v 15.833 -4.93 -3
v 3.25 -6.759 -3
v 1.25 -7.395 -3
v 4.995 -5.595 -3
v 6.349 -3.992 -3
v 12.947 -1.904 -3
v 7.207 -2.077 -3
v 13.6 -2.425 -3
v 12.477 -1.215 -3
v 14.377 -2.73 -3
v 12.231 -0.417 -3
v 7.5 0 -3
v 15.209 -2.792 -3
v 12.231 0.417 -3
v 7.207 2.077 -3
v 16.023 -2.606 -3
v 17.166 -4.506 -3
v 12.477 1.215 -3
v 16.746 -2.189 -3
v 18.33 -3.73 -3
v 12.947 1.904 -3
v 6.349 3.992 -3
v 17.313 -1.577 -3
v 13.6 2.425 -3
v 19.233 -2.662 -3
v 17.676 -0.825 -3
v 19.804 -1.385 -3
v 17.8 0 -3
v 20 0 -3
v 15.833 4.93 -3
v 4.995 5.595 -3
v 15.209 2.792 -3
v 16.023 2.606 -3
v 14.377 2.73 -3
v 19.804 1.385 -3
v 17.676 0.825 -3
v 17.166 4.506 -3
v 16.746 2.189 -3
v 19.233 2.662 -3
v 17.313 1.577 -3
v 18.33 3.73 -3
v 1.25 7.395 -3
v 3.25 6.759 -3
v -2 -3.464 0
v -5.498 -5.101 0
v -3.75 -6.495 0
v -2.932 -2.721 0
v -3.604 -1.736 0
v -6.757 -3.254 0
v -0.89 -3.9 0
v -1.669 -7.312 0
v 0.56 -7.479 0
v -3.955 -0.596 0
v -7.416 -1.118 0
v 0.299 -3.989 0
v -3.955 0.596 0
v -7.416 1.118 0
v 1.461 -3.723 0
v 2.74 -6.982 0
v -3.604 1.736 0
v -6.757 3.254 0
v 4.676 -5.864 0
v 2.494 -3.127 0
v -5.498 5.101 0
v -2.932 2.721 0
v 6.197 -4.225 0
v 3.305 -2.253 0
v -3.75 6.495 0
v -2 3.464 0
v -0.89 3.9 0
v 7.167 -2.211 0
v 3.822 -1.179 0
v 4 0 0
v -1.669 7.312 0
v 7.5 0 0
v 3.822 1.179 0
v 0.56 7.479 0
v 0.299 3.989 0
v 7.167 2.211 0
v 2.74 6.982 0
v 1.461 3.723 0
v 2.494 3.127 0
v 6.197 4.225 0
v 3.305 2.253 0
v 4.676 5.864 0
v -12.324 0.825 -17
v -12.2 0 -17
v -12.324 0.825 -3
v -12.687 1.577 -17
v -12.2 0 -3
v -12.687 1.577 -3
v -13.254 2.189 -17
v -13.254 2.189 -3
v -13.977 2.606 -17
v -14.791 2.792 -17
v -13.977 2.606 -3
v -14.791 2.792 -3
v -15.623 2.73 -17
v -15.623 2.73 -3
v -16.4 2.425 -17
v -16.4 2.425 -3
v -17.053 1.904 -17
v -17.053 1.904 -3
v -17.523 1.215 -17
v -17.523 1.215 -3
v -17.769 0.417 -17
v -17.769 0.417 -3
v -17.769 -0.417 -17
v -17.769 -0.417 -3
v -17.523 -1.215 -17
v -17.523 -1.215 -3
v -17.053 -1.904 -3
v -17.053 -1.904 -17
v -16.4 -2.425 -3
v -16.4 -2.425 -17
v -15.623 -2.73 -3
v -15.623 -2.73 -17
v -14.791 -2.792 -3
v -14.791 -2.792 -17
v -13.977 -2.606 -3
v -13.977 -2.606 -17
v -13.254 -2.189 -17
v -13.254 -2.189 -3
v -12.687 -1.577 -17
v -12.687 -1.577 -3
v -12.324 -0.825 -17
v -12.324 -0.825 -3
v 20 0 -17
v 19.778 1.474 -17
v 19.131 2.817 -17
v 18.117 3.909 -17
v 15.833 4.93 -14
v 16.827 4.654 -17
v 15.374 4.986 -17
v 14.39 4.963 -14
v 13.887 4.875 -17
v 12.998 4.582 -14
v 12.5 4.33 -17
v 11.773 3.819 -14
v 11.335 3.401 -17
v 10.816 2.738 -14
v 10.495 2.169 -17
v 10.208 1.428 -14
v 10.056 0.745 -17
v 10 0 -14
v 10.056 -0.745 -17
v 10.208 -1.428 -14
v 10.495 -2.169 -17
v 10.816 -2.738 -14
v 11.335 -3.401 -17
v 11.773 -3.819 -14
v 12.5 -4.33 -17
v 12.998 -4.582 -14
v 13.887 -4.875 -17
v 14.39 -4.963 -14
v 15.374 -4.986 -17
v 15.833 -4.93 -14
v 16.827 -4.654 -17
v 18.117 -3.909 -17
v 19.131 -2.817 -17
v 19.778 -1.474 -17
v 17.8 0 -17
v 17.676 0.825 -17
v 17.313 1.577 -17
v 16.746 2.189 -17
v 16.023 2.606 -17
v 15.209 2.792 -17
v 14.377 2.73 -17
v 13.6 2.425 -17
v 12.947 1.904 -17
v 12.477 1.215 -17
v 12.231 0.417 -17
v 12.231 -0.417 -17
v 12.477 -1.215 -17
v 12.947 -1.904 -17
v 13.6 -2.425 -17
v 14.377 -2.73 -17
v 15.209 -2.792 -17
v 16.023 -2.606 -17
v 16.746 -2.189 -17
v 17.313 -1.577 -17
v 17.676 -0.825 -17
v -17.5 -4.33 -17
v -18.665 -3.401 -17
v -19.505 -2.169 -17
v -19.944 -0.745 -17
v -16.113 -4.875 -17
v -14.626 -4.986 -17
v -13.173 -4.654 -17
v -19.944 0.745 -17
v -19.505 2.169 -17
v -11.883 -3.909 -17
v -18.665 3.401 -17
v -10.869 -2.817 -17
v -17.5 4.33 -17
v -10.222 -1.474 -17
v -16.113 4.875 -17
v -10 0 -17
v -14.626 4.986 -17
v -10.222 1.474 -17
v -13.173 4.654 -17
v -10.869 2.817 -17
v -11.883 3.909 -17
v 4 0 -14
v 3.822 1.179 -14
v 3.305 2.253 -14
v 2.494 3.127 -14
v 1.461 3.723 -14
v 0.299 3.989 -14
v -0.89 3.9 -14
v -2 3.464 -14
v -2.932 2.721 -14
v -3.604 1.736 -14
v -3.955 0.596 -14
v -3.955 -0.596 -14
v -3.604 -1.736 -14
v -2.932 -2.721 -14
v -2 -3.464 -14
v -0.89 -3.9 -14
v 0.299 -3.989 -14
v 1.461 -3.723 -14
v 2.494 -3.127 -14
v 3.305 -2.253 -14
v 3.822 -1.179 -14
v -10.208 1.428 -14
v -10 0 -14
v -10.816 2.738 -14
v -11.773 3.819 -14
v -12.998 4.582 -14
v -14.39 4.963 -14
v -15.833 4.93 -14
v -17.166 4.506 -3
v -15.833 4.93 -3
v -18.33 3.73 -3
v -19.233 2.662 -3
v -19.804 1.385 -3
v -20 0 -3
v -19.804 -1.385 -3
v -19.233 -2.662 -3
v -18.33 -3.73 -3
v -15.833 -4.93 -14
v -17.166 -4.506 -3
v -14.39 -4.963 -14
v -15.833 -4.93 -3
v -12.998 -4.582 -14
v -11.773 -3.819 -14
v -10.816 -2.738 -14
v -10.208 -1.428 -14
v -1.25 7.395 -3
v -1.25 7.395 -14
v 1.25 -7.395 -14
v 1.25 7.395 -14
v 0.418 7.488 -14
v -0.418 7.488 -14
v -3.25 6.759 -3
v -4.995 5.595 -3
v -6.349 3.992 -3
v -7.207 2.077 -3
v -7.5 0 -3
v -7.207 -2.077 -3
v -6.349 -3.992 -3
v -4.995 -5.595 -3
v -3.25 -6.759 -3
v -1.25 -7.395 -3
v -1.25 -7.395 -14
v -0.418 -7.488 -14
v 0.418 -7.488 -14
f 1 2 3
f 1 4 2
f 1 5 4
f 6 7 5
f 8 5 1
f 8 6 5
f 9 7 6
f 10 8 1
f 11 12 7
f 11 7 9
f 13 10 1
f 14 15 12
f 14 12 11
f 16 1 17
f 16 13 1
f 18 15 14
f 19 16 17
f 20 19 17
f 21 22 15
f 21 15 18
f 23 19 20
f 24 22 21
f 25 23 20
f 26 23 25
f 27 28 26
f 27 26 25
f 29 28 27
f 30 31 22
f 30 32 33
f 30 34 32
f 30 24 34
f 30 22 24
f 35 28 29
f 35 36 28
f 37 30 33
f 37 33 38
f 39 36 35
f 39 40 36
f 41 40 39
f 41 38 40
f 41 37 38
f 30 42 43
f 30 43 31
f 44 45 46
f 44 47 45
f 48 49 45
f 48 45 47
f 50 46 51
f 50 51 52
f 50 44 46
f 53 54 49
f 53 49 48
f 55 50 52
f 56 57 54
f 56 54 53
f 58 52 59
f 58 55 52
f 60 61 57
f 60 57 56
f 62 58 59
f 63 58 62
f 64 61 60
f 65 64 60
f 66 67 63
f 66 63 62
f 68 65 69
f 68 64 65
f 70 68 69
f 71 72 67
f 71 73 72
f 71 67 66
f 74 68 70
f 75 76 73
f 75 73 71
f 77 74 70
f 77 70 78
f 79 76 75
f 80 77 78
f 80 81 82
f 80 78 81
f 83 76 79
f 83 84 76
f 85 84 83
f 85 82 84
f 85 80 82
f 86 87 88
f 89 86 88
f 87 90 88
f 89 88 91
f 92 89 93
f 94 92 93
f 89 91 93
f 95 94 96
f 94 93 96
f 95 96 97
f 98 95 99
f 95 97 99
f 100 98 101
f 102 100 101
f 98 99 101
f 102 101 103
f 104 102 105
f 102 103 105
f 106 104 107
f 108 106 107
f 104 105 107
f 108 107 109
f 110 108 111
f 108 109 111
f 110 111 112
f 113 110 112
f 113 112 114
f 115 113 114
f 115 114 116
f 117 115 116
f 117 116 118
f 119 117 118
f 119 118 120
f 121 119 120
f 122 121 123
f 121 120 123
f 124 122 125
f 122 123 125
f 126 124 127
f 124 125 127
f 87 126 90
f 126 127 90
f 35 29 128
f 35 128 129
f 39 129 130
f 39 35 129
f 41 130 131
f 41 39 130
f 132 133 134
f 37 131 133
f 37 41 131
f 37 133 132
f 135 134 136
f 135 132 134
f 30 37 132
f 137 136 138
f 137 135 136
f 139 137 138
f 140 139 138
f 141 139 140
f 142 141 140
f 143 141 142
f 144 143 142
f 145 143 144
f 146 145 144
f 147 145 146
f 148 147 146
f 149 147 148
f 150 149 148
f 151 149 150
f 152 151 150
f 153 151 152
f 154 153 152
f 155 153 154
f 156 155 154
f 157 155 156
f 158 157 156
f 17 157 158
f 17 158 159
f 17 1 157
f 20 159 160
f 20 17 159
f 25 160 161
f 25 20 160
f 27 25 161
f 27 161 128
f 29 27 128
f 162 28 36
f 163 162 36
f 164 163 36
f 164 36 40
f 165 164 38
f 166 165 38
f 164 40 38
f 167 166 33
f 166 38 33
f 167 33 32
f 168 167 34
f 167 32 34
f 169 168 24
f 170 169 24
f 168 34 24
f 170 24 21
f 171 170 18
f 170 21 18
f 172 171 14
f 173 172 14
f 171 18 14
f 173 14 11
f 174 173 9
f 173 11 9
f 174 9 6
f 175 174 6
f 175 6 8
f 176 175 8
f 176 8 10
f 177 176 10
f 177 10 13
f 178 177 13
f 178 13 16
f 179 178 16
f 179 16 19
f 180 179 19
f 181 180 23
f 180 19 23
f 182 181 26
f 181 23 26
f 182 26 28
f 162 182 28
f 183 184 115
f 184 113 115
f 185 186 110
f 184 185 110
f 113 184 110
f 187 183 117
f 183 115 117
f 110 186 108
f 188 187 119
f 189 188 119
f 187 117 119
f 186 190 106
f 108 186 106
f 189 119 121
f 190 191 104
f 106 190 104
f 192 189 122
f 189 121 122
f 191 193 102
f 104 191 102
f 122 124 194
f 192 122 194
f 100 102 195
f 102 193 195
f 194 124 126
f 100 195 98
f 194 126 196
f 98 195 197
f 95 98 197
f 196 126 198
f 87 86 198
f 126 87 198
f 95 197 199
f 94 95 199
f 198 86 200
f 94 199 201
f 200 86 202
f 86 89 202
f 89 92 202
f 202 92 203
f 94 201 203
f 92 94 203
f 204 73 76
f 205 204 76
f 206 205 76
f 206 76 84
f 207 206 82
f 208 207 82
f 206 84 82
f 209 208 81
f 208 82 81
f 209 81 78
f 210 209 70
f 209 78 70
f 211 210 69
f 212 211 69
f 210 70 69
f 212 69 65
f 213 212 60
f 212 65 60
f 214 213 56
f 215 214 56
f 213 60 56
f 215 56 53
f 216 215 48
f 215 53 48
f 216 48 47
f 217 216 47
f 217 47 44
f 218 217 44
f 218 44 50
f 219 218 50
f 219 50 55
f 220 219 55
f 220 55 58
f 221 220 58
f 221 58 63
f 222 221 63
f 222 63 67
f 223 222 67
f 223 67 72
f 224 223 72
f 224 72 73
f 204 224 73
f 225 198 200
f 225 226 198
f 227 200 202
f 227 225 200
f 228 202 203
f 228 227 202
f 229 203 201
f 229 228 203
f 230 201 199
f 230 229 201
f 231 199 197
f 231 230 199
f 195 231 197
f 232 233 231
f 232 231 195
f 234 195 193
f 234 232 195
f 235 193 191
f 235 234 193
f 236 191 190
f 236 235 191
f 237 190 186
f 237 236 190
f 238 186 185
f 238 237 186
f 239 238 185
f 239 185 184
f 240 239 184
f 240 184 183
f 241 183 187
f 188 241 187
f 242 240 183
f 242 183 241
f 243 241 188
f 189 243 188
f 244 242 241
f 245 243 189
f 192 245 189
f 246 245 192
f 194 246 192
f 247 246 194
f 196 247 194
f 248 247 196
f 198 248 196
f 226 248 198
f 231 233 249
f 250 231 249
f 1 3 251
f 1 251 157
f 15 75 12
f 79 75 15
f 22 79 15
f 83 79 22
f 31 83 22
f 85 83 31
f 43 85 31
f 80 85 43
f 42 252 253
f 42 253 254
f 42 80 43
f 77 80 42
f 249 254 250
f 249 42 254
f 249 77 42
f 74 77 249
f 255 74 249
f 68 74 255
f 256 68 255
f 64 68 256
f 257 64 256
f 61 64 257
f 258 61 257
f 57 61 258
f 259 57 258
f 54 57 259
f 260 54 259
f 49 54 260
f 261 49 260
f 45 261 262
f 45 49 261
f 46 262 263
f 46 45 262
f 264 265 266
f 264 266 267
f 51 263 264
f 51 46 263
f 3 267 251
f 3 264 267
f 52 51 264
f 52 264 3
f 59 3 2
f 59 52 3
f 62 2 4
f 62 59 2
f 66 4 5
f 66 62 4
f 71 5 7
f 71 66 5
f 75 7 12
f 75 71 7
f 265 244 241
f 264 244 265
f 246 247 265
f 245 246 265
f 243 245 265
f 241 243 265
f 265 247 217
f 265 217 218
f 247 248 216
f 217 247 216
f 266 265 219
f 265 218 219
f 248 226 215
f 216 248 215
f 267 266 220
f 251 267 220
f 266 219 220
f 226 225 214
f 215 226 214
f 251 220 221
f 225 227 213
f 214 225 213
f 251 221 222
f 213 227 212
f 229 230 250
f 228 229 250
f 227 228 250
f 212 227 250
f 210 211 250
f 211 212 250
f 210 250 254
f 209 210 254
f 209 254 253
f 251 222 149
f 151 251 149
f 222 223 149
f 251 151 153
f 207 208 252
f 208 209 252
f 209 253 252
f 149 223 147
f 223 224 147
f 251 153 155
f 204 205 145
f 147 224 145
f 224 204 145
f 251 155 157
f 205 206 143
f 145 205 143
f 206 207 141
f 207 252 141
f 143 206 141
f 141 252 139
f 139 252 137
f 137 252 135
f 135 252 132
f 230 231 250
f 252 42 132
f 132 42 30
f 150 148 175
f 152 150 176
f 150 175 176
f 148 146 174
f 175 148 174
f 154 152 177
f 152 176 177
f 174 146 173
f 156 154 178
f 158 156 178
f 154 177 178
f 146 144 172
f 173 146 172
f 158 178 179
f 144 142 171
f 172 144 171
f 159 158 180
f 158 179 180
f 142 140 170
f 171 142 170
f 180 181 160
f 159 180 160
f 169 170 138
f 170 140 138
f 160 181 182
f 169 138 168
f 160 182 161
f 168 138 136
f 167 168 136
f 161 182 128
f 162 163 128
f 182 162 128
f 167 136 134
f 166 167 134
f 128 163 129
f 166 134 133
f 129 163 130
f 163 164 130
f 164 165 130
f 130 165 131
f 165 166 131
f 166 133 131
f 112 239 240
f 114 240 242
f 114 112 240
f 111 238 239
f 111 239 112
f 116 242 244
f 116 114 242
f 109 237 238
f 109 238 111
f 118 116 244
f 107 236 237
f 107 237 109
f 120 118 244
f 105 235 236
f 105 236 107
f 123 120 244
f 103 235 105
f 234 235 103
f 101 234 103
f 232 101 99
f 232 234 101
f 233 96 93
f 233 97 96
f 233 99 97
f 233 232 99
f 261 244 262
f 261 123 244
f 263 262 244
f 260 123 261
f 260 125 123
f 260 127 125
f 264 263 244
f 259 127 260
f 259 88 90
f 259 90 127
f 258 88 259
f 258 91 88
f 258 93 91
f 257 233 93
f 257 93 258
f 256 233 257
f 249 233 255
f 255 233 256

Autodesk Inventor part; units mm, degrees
ref_plane "YZ Plane" through (0, 0, 0) normal (1, 0, 0) x (0, 1, 0)
ref_plane "XZ Plane" through (0, 0, 0) normal (0, 1, 0) x (-1, 0, 0)
sketch "Skizze1" plane through (0, 0, 0) normal (0, 0, 1) x (1, 0, 0)
  circle A0 centre (0, 0) radius 7.5
  circle A1 centre (0, 0) radius 4
  dimension "d0" = 15
  dimension "d3" = 8
extrude "Extrusion1" add sketch "Skizze1" against normal blind 14
ref_plane "Arbeitsebene1" through (0, 0, -3) normal (0, 0, 1) x (1, 0, 0)
sketch "Skizze2" plane through (0, 0, -3) normal (0, 0, 1) x (1, 0, 0)
  circle A0 centre (-15, 0) radius 5
  circle A1 centre (15, 0) radius 5
  circle A2 centre (-15, 0) radius 2.8
  circle A3 centre (15, 0) radius 2.8
  point P0 (0, 0)
  dimension "d5" = 10
  dimension "d6" = 10
  dimension "d7" = 15
  dimension "d8" = 15
  dimension "d9" = 5.6
  dimension "d10" = 5.6
extrude "Extrusion2" add sketch "Skizze2" against normal blind 14
sketch "Skizze3" plane through (-15, 0, -3) normal (0, 0, 1) x (1, 0, 0)
  circle A0 centre (0, 0) radius 5 projected
  circle A1 centre (0, 0) radius 2.8 projected
  circle A2 centre (15, 0) radius 7.5 projected
  circle A3 centre (15, 0) radius 4 projected
  circle A4 centre (30, 0) radius 5 projected
  circle A5 centre (30, 0) radius 2.8 projected
  circle A6 centre (15, 0) radius 7.5 projected
  line L0 (-5.1094, 4.2073) -> (15, 7.6064)
  line L1 (15, 7.6064) -> (38.7432, 3.5931)
  circle A7 centre (30, 0) radius 5 projected
  line L2 (-7.8587, -3.7426) -> (15, -7.6064)
  line L3 (15, -7.6064) -> (39.1845, -3.5185)
  point P0 (16.25, -7.3951)
  point P1 (30.8333, -4.9301)
  point P2 (30.8333, 4.9301)
  point P3 (16.25, 7.3951)
  point P4 (-0.8333, -4.9301)
  point P5 (13.75, -7.3951)
  point P6 (13.75, 7.3951)
  point P7 (-0.8333, 4.9301)
extrude "Extrusion3" add sketch "Skizze3" against normal blind 11 contours A0 L0 A2 L2 | L1 A4 L3 A2
properties part number "250_CameraMount"
